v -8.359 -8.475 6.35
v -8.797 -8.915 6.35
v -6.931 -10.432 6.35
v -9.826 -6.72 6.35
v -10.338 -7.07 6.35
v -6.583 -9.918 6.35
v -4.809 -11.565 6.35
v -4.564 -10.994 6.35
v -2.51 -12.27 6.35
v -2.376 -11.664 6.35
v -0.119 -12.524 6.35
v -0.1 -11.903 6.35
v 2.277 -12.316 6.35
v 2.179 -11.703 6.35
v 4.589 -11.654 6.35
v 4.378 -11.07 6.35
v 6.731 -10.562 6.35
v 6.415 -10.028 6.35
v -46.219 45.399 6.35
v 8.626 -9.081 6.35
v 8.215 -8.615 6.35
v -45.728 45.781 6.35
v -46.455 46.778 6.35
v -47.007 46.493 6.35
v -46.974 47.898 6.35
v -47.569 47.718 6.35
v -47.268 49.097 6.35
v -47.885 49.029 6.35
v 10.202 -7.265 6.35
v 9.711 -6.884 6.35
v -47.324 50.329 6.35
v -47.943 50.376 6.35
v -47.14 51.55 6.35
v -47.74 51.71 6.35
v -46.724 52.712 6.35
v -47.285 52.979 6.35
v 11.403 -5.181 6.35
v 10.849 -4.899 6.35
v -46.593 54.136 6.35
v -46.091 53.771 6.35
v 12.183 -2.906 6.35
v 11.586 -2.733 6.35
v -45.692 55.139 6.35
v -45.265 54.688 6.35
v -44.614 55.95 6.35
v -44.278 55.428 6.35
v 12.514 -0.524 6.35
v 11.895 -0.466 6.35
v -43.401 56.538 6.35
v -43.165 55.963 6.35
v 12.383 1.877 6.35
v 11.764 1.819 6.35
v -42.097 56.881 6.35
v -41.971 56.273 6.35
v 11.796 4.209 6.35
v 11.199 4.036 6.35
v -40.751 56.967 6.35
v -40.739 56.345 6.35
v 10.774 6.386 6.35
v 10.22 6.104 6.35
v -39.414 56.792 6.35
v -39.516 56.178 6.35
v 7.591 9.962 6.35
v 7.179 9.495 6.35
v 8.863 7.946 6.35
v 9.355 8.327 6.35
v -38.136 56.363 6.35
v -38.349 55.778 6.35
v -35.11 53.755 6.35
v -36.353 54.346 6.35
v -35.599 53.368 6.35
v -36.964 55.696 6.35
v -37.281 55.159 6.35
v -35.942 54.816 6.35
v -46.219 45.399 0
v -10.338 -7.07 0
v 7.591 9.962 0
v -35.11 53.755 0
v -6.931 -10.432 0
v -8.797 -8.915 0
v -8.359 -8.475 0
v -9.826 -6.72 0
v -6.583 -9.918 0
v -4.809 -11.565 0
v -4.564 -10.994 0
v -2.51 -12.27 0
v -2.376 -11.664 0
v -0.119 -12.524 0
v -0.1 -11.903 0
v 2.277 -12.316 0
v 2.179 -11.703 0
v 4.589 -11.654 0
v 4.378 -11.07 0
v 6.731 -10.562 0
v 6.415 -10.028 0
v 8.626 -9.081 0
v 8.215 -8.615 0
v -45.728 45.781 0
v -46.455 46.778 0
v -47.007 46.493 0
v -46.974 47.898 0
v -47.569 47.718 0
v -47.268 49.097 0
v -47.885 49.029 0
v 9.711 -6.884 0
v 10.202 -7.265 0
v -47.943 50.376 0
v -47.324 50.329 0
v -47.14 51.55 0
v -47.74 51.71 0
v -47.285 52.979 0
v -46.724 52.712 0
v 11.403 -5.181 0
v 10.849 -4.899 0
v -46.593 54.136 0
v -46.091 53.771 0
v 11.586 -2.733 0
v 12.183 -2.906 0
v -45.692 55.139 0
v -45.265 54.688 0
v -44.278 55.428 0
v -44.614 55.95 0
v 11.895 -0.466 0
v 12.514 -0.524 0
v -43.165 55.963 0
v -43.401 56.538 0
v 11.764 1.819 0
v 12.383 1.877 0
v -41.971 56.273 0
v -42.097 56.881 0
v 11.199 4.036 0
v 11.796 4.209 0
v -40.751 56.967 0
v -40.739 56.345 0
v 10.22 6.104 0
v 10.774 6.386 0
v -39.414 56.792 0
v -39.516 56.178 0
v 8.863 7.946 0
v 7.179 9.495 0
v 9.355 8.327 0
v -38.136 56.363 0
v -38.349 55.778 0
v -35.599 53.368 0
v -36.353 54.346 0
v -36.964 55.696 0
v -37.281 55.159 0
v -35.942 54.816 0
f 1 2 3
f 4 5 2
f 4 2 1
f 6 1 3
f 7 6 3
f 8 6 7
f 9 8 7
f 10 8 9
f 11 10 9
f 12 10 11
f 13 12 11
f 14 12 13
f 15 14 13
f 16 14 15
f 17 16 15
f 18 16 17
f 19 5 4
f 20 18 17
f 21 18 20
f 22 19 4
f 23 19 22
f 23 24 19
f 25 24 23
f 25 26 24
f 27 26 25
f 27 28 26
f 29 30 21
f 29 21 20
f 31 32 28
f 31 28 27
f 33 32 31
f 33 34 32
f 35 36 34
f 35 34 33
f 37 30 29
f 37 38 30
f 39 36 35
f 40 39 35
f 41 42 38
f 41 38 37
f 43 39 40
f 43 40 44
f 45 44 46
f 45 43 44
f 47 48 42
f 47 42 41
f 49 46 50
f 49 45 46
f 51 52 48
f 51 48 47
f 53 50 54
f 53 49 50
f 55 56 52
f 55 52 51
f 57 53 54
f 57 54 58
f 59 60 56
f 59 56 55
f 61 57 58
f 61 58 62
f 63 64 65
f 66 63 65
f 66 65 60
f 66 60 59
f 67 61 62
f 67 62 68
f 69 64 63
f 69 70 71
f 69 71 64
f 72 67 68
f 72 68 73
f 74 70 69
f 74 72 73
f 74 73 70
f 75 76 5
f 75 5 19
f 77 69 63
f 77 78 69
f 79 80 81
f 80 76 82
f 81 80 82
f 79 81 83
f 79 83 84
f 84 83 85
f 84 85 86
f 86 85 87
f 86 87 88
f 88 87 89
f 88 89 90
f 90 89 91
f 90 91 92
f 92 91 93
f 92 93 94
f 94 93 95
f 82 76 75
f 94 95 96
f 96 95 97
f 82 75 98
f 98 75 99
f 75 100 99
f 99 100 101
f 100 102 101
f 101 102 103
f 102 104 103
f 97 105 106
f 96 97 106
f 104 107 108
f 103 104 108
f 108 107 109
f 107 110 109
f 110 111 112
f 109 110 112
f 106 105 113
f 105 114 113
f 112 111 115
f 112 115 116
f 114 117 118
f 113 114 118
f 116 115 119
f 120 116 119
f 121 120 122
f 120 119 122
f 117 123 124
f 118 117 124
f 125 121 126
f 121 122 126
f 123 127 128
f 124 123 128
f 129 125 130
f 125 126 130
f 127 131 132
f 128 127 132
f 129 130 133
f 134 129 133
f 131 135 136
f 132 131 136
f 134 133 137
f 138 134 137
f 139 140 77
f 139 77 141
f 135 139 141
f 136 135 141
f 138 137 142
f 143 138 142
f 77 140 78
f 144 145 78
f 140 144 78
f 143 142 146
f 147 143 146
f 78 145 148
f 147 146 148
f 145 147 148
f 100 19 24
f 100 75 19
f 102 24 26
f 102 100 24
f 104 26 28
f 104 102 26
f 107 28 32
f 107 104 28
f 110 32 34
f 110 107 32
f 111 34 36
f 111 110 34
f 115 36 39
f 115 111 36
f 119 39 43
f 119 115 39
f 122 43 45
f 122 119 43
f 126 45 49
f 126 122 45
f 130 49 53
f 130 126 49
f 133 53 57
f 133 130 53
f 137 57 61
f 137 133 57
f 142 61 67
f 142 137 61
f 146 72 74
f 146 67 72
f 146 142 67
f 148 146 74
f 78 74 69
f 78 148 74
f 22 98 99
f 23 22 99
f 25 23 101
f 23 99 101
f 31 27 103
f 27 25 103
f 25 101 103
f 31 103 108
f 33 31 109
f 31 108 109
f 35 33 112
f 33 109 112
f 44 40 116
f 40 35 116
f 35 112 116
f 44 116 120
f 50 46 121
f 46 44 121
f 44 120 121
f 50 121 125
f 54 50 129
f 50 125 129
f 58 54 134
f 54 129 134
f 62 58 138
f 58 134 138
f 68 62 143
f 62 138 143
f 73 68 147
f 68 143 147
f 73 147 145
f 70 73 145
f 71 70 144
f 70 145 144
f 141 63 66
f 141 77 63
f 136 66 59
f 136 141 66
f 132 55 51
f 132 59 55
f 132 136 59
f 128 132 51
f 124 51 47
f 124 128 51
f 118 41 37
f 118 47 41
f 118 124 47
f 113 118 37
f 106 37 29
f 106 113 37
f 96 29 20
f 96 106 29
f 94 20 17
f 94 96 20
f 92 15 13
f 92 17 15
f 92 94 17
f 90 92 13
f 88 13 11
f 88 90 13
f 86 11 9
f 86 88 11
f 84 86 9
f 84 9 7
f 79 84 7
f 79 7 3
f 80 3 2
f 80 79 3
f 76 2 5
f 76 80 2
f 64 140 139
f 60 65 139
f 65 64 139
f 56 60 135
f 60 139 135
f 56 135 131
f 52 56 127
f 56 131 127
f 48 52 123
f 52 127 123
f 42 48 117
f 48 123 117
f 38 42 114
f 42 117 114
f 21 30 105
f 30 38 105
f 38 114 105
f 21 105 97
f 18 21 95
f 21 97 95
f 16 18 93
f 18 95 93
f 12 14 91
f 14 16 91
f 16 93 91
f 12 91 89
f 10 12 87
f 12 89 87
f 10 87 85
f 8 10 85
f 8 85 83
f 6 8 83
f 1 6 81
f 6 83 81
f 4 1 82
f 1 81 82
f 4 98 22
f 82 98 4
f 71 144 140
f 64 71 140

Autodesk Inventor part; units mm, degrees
ref_plane "YZ Plane" through (0, 0, 0) normal (1, 0, 0) x (0, 1, 0)
ref_plane "XZ Plane" through (0, 0, 0) normal (0, 1, 0) x (-1, 0, 0)
ref_plane "XY Plane" through (0, 0, 0) normal (0, 0, 1) x (1, 0, 0)
sketch "Sketch1" plane through (0, 0, 0) normal (0, 0, 1) x (1, 0, 0)
  arc A0 (-6.3312, 9.4953) -> (-1.2535, 11.3435) centre (0, 0) ccw projected
  arc A1 (-39.762, 56.0914) -> (-36.7433, 54.5415) centre (-40.9824, 50) ccw projected
  arc A2 (-35.5994, 53.3683) -> (-45.7281, 45.7808) centre (-40.9824, 50) ccw
  arc A3 (-9.826, -6.7195) -> (7.1791, 9.4953) centre (0, 0) ccw
  line L0 (-45.7281, 45.7808) -> (-9.826, -6.7195)
  line L1 (-36.7433, 54.5415) -> (-36.3354, 54.1231)
  line L2 (-35.5994, 53.3683) -> (7.1791, 9.4953)
  arc A4 (-10.3384, -7.0699) -> (7.5913, 9.9618) centre (0, 0) ccw
  line L3 (-10.3384, -7.0699) -> (-46.2188, 45.3986)
  arc A5 (-35.1095, 53.7552) -> (-46.2188, 45.3986) centre (-40.9824, 50) ccw
  line L4 (-35.1095, 53.7552) -> (7.5913, 9.9618)
  point P0 (0, 0)
  dimension "d0" = 12.7
extrude "Extrusion1" add sketch "Sketch1" along normal blind 6.35 contours L3 A5 L4 A4
properties part number "z-belt"
